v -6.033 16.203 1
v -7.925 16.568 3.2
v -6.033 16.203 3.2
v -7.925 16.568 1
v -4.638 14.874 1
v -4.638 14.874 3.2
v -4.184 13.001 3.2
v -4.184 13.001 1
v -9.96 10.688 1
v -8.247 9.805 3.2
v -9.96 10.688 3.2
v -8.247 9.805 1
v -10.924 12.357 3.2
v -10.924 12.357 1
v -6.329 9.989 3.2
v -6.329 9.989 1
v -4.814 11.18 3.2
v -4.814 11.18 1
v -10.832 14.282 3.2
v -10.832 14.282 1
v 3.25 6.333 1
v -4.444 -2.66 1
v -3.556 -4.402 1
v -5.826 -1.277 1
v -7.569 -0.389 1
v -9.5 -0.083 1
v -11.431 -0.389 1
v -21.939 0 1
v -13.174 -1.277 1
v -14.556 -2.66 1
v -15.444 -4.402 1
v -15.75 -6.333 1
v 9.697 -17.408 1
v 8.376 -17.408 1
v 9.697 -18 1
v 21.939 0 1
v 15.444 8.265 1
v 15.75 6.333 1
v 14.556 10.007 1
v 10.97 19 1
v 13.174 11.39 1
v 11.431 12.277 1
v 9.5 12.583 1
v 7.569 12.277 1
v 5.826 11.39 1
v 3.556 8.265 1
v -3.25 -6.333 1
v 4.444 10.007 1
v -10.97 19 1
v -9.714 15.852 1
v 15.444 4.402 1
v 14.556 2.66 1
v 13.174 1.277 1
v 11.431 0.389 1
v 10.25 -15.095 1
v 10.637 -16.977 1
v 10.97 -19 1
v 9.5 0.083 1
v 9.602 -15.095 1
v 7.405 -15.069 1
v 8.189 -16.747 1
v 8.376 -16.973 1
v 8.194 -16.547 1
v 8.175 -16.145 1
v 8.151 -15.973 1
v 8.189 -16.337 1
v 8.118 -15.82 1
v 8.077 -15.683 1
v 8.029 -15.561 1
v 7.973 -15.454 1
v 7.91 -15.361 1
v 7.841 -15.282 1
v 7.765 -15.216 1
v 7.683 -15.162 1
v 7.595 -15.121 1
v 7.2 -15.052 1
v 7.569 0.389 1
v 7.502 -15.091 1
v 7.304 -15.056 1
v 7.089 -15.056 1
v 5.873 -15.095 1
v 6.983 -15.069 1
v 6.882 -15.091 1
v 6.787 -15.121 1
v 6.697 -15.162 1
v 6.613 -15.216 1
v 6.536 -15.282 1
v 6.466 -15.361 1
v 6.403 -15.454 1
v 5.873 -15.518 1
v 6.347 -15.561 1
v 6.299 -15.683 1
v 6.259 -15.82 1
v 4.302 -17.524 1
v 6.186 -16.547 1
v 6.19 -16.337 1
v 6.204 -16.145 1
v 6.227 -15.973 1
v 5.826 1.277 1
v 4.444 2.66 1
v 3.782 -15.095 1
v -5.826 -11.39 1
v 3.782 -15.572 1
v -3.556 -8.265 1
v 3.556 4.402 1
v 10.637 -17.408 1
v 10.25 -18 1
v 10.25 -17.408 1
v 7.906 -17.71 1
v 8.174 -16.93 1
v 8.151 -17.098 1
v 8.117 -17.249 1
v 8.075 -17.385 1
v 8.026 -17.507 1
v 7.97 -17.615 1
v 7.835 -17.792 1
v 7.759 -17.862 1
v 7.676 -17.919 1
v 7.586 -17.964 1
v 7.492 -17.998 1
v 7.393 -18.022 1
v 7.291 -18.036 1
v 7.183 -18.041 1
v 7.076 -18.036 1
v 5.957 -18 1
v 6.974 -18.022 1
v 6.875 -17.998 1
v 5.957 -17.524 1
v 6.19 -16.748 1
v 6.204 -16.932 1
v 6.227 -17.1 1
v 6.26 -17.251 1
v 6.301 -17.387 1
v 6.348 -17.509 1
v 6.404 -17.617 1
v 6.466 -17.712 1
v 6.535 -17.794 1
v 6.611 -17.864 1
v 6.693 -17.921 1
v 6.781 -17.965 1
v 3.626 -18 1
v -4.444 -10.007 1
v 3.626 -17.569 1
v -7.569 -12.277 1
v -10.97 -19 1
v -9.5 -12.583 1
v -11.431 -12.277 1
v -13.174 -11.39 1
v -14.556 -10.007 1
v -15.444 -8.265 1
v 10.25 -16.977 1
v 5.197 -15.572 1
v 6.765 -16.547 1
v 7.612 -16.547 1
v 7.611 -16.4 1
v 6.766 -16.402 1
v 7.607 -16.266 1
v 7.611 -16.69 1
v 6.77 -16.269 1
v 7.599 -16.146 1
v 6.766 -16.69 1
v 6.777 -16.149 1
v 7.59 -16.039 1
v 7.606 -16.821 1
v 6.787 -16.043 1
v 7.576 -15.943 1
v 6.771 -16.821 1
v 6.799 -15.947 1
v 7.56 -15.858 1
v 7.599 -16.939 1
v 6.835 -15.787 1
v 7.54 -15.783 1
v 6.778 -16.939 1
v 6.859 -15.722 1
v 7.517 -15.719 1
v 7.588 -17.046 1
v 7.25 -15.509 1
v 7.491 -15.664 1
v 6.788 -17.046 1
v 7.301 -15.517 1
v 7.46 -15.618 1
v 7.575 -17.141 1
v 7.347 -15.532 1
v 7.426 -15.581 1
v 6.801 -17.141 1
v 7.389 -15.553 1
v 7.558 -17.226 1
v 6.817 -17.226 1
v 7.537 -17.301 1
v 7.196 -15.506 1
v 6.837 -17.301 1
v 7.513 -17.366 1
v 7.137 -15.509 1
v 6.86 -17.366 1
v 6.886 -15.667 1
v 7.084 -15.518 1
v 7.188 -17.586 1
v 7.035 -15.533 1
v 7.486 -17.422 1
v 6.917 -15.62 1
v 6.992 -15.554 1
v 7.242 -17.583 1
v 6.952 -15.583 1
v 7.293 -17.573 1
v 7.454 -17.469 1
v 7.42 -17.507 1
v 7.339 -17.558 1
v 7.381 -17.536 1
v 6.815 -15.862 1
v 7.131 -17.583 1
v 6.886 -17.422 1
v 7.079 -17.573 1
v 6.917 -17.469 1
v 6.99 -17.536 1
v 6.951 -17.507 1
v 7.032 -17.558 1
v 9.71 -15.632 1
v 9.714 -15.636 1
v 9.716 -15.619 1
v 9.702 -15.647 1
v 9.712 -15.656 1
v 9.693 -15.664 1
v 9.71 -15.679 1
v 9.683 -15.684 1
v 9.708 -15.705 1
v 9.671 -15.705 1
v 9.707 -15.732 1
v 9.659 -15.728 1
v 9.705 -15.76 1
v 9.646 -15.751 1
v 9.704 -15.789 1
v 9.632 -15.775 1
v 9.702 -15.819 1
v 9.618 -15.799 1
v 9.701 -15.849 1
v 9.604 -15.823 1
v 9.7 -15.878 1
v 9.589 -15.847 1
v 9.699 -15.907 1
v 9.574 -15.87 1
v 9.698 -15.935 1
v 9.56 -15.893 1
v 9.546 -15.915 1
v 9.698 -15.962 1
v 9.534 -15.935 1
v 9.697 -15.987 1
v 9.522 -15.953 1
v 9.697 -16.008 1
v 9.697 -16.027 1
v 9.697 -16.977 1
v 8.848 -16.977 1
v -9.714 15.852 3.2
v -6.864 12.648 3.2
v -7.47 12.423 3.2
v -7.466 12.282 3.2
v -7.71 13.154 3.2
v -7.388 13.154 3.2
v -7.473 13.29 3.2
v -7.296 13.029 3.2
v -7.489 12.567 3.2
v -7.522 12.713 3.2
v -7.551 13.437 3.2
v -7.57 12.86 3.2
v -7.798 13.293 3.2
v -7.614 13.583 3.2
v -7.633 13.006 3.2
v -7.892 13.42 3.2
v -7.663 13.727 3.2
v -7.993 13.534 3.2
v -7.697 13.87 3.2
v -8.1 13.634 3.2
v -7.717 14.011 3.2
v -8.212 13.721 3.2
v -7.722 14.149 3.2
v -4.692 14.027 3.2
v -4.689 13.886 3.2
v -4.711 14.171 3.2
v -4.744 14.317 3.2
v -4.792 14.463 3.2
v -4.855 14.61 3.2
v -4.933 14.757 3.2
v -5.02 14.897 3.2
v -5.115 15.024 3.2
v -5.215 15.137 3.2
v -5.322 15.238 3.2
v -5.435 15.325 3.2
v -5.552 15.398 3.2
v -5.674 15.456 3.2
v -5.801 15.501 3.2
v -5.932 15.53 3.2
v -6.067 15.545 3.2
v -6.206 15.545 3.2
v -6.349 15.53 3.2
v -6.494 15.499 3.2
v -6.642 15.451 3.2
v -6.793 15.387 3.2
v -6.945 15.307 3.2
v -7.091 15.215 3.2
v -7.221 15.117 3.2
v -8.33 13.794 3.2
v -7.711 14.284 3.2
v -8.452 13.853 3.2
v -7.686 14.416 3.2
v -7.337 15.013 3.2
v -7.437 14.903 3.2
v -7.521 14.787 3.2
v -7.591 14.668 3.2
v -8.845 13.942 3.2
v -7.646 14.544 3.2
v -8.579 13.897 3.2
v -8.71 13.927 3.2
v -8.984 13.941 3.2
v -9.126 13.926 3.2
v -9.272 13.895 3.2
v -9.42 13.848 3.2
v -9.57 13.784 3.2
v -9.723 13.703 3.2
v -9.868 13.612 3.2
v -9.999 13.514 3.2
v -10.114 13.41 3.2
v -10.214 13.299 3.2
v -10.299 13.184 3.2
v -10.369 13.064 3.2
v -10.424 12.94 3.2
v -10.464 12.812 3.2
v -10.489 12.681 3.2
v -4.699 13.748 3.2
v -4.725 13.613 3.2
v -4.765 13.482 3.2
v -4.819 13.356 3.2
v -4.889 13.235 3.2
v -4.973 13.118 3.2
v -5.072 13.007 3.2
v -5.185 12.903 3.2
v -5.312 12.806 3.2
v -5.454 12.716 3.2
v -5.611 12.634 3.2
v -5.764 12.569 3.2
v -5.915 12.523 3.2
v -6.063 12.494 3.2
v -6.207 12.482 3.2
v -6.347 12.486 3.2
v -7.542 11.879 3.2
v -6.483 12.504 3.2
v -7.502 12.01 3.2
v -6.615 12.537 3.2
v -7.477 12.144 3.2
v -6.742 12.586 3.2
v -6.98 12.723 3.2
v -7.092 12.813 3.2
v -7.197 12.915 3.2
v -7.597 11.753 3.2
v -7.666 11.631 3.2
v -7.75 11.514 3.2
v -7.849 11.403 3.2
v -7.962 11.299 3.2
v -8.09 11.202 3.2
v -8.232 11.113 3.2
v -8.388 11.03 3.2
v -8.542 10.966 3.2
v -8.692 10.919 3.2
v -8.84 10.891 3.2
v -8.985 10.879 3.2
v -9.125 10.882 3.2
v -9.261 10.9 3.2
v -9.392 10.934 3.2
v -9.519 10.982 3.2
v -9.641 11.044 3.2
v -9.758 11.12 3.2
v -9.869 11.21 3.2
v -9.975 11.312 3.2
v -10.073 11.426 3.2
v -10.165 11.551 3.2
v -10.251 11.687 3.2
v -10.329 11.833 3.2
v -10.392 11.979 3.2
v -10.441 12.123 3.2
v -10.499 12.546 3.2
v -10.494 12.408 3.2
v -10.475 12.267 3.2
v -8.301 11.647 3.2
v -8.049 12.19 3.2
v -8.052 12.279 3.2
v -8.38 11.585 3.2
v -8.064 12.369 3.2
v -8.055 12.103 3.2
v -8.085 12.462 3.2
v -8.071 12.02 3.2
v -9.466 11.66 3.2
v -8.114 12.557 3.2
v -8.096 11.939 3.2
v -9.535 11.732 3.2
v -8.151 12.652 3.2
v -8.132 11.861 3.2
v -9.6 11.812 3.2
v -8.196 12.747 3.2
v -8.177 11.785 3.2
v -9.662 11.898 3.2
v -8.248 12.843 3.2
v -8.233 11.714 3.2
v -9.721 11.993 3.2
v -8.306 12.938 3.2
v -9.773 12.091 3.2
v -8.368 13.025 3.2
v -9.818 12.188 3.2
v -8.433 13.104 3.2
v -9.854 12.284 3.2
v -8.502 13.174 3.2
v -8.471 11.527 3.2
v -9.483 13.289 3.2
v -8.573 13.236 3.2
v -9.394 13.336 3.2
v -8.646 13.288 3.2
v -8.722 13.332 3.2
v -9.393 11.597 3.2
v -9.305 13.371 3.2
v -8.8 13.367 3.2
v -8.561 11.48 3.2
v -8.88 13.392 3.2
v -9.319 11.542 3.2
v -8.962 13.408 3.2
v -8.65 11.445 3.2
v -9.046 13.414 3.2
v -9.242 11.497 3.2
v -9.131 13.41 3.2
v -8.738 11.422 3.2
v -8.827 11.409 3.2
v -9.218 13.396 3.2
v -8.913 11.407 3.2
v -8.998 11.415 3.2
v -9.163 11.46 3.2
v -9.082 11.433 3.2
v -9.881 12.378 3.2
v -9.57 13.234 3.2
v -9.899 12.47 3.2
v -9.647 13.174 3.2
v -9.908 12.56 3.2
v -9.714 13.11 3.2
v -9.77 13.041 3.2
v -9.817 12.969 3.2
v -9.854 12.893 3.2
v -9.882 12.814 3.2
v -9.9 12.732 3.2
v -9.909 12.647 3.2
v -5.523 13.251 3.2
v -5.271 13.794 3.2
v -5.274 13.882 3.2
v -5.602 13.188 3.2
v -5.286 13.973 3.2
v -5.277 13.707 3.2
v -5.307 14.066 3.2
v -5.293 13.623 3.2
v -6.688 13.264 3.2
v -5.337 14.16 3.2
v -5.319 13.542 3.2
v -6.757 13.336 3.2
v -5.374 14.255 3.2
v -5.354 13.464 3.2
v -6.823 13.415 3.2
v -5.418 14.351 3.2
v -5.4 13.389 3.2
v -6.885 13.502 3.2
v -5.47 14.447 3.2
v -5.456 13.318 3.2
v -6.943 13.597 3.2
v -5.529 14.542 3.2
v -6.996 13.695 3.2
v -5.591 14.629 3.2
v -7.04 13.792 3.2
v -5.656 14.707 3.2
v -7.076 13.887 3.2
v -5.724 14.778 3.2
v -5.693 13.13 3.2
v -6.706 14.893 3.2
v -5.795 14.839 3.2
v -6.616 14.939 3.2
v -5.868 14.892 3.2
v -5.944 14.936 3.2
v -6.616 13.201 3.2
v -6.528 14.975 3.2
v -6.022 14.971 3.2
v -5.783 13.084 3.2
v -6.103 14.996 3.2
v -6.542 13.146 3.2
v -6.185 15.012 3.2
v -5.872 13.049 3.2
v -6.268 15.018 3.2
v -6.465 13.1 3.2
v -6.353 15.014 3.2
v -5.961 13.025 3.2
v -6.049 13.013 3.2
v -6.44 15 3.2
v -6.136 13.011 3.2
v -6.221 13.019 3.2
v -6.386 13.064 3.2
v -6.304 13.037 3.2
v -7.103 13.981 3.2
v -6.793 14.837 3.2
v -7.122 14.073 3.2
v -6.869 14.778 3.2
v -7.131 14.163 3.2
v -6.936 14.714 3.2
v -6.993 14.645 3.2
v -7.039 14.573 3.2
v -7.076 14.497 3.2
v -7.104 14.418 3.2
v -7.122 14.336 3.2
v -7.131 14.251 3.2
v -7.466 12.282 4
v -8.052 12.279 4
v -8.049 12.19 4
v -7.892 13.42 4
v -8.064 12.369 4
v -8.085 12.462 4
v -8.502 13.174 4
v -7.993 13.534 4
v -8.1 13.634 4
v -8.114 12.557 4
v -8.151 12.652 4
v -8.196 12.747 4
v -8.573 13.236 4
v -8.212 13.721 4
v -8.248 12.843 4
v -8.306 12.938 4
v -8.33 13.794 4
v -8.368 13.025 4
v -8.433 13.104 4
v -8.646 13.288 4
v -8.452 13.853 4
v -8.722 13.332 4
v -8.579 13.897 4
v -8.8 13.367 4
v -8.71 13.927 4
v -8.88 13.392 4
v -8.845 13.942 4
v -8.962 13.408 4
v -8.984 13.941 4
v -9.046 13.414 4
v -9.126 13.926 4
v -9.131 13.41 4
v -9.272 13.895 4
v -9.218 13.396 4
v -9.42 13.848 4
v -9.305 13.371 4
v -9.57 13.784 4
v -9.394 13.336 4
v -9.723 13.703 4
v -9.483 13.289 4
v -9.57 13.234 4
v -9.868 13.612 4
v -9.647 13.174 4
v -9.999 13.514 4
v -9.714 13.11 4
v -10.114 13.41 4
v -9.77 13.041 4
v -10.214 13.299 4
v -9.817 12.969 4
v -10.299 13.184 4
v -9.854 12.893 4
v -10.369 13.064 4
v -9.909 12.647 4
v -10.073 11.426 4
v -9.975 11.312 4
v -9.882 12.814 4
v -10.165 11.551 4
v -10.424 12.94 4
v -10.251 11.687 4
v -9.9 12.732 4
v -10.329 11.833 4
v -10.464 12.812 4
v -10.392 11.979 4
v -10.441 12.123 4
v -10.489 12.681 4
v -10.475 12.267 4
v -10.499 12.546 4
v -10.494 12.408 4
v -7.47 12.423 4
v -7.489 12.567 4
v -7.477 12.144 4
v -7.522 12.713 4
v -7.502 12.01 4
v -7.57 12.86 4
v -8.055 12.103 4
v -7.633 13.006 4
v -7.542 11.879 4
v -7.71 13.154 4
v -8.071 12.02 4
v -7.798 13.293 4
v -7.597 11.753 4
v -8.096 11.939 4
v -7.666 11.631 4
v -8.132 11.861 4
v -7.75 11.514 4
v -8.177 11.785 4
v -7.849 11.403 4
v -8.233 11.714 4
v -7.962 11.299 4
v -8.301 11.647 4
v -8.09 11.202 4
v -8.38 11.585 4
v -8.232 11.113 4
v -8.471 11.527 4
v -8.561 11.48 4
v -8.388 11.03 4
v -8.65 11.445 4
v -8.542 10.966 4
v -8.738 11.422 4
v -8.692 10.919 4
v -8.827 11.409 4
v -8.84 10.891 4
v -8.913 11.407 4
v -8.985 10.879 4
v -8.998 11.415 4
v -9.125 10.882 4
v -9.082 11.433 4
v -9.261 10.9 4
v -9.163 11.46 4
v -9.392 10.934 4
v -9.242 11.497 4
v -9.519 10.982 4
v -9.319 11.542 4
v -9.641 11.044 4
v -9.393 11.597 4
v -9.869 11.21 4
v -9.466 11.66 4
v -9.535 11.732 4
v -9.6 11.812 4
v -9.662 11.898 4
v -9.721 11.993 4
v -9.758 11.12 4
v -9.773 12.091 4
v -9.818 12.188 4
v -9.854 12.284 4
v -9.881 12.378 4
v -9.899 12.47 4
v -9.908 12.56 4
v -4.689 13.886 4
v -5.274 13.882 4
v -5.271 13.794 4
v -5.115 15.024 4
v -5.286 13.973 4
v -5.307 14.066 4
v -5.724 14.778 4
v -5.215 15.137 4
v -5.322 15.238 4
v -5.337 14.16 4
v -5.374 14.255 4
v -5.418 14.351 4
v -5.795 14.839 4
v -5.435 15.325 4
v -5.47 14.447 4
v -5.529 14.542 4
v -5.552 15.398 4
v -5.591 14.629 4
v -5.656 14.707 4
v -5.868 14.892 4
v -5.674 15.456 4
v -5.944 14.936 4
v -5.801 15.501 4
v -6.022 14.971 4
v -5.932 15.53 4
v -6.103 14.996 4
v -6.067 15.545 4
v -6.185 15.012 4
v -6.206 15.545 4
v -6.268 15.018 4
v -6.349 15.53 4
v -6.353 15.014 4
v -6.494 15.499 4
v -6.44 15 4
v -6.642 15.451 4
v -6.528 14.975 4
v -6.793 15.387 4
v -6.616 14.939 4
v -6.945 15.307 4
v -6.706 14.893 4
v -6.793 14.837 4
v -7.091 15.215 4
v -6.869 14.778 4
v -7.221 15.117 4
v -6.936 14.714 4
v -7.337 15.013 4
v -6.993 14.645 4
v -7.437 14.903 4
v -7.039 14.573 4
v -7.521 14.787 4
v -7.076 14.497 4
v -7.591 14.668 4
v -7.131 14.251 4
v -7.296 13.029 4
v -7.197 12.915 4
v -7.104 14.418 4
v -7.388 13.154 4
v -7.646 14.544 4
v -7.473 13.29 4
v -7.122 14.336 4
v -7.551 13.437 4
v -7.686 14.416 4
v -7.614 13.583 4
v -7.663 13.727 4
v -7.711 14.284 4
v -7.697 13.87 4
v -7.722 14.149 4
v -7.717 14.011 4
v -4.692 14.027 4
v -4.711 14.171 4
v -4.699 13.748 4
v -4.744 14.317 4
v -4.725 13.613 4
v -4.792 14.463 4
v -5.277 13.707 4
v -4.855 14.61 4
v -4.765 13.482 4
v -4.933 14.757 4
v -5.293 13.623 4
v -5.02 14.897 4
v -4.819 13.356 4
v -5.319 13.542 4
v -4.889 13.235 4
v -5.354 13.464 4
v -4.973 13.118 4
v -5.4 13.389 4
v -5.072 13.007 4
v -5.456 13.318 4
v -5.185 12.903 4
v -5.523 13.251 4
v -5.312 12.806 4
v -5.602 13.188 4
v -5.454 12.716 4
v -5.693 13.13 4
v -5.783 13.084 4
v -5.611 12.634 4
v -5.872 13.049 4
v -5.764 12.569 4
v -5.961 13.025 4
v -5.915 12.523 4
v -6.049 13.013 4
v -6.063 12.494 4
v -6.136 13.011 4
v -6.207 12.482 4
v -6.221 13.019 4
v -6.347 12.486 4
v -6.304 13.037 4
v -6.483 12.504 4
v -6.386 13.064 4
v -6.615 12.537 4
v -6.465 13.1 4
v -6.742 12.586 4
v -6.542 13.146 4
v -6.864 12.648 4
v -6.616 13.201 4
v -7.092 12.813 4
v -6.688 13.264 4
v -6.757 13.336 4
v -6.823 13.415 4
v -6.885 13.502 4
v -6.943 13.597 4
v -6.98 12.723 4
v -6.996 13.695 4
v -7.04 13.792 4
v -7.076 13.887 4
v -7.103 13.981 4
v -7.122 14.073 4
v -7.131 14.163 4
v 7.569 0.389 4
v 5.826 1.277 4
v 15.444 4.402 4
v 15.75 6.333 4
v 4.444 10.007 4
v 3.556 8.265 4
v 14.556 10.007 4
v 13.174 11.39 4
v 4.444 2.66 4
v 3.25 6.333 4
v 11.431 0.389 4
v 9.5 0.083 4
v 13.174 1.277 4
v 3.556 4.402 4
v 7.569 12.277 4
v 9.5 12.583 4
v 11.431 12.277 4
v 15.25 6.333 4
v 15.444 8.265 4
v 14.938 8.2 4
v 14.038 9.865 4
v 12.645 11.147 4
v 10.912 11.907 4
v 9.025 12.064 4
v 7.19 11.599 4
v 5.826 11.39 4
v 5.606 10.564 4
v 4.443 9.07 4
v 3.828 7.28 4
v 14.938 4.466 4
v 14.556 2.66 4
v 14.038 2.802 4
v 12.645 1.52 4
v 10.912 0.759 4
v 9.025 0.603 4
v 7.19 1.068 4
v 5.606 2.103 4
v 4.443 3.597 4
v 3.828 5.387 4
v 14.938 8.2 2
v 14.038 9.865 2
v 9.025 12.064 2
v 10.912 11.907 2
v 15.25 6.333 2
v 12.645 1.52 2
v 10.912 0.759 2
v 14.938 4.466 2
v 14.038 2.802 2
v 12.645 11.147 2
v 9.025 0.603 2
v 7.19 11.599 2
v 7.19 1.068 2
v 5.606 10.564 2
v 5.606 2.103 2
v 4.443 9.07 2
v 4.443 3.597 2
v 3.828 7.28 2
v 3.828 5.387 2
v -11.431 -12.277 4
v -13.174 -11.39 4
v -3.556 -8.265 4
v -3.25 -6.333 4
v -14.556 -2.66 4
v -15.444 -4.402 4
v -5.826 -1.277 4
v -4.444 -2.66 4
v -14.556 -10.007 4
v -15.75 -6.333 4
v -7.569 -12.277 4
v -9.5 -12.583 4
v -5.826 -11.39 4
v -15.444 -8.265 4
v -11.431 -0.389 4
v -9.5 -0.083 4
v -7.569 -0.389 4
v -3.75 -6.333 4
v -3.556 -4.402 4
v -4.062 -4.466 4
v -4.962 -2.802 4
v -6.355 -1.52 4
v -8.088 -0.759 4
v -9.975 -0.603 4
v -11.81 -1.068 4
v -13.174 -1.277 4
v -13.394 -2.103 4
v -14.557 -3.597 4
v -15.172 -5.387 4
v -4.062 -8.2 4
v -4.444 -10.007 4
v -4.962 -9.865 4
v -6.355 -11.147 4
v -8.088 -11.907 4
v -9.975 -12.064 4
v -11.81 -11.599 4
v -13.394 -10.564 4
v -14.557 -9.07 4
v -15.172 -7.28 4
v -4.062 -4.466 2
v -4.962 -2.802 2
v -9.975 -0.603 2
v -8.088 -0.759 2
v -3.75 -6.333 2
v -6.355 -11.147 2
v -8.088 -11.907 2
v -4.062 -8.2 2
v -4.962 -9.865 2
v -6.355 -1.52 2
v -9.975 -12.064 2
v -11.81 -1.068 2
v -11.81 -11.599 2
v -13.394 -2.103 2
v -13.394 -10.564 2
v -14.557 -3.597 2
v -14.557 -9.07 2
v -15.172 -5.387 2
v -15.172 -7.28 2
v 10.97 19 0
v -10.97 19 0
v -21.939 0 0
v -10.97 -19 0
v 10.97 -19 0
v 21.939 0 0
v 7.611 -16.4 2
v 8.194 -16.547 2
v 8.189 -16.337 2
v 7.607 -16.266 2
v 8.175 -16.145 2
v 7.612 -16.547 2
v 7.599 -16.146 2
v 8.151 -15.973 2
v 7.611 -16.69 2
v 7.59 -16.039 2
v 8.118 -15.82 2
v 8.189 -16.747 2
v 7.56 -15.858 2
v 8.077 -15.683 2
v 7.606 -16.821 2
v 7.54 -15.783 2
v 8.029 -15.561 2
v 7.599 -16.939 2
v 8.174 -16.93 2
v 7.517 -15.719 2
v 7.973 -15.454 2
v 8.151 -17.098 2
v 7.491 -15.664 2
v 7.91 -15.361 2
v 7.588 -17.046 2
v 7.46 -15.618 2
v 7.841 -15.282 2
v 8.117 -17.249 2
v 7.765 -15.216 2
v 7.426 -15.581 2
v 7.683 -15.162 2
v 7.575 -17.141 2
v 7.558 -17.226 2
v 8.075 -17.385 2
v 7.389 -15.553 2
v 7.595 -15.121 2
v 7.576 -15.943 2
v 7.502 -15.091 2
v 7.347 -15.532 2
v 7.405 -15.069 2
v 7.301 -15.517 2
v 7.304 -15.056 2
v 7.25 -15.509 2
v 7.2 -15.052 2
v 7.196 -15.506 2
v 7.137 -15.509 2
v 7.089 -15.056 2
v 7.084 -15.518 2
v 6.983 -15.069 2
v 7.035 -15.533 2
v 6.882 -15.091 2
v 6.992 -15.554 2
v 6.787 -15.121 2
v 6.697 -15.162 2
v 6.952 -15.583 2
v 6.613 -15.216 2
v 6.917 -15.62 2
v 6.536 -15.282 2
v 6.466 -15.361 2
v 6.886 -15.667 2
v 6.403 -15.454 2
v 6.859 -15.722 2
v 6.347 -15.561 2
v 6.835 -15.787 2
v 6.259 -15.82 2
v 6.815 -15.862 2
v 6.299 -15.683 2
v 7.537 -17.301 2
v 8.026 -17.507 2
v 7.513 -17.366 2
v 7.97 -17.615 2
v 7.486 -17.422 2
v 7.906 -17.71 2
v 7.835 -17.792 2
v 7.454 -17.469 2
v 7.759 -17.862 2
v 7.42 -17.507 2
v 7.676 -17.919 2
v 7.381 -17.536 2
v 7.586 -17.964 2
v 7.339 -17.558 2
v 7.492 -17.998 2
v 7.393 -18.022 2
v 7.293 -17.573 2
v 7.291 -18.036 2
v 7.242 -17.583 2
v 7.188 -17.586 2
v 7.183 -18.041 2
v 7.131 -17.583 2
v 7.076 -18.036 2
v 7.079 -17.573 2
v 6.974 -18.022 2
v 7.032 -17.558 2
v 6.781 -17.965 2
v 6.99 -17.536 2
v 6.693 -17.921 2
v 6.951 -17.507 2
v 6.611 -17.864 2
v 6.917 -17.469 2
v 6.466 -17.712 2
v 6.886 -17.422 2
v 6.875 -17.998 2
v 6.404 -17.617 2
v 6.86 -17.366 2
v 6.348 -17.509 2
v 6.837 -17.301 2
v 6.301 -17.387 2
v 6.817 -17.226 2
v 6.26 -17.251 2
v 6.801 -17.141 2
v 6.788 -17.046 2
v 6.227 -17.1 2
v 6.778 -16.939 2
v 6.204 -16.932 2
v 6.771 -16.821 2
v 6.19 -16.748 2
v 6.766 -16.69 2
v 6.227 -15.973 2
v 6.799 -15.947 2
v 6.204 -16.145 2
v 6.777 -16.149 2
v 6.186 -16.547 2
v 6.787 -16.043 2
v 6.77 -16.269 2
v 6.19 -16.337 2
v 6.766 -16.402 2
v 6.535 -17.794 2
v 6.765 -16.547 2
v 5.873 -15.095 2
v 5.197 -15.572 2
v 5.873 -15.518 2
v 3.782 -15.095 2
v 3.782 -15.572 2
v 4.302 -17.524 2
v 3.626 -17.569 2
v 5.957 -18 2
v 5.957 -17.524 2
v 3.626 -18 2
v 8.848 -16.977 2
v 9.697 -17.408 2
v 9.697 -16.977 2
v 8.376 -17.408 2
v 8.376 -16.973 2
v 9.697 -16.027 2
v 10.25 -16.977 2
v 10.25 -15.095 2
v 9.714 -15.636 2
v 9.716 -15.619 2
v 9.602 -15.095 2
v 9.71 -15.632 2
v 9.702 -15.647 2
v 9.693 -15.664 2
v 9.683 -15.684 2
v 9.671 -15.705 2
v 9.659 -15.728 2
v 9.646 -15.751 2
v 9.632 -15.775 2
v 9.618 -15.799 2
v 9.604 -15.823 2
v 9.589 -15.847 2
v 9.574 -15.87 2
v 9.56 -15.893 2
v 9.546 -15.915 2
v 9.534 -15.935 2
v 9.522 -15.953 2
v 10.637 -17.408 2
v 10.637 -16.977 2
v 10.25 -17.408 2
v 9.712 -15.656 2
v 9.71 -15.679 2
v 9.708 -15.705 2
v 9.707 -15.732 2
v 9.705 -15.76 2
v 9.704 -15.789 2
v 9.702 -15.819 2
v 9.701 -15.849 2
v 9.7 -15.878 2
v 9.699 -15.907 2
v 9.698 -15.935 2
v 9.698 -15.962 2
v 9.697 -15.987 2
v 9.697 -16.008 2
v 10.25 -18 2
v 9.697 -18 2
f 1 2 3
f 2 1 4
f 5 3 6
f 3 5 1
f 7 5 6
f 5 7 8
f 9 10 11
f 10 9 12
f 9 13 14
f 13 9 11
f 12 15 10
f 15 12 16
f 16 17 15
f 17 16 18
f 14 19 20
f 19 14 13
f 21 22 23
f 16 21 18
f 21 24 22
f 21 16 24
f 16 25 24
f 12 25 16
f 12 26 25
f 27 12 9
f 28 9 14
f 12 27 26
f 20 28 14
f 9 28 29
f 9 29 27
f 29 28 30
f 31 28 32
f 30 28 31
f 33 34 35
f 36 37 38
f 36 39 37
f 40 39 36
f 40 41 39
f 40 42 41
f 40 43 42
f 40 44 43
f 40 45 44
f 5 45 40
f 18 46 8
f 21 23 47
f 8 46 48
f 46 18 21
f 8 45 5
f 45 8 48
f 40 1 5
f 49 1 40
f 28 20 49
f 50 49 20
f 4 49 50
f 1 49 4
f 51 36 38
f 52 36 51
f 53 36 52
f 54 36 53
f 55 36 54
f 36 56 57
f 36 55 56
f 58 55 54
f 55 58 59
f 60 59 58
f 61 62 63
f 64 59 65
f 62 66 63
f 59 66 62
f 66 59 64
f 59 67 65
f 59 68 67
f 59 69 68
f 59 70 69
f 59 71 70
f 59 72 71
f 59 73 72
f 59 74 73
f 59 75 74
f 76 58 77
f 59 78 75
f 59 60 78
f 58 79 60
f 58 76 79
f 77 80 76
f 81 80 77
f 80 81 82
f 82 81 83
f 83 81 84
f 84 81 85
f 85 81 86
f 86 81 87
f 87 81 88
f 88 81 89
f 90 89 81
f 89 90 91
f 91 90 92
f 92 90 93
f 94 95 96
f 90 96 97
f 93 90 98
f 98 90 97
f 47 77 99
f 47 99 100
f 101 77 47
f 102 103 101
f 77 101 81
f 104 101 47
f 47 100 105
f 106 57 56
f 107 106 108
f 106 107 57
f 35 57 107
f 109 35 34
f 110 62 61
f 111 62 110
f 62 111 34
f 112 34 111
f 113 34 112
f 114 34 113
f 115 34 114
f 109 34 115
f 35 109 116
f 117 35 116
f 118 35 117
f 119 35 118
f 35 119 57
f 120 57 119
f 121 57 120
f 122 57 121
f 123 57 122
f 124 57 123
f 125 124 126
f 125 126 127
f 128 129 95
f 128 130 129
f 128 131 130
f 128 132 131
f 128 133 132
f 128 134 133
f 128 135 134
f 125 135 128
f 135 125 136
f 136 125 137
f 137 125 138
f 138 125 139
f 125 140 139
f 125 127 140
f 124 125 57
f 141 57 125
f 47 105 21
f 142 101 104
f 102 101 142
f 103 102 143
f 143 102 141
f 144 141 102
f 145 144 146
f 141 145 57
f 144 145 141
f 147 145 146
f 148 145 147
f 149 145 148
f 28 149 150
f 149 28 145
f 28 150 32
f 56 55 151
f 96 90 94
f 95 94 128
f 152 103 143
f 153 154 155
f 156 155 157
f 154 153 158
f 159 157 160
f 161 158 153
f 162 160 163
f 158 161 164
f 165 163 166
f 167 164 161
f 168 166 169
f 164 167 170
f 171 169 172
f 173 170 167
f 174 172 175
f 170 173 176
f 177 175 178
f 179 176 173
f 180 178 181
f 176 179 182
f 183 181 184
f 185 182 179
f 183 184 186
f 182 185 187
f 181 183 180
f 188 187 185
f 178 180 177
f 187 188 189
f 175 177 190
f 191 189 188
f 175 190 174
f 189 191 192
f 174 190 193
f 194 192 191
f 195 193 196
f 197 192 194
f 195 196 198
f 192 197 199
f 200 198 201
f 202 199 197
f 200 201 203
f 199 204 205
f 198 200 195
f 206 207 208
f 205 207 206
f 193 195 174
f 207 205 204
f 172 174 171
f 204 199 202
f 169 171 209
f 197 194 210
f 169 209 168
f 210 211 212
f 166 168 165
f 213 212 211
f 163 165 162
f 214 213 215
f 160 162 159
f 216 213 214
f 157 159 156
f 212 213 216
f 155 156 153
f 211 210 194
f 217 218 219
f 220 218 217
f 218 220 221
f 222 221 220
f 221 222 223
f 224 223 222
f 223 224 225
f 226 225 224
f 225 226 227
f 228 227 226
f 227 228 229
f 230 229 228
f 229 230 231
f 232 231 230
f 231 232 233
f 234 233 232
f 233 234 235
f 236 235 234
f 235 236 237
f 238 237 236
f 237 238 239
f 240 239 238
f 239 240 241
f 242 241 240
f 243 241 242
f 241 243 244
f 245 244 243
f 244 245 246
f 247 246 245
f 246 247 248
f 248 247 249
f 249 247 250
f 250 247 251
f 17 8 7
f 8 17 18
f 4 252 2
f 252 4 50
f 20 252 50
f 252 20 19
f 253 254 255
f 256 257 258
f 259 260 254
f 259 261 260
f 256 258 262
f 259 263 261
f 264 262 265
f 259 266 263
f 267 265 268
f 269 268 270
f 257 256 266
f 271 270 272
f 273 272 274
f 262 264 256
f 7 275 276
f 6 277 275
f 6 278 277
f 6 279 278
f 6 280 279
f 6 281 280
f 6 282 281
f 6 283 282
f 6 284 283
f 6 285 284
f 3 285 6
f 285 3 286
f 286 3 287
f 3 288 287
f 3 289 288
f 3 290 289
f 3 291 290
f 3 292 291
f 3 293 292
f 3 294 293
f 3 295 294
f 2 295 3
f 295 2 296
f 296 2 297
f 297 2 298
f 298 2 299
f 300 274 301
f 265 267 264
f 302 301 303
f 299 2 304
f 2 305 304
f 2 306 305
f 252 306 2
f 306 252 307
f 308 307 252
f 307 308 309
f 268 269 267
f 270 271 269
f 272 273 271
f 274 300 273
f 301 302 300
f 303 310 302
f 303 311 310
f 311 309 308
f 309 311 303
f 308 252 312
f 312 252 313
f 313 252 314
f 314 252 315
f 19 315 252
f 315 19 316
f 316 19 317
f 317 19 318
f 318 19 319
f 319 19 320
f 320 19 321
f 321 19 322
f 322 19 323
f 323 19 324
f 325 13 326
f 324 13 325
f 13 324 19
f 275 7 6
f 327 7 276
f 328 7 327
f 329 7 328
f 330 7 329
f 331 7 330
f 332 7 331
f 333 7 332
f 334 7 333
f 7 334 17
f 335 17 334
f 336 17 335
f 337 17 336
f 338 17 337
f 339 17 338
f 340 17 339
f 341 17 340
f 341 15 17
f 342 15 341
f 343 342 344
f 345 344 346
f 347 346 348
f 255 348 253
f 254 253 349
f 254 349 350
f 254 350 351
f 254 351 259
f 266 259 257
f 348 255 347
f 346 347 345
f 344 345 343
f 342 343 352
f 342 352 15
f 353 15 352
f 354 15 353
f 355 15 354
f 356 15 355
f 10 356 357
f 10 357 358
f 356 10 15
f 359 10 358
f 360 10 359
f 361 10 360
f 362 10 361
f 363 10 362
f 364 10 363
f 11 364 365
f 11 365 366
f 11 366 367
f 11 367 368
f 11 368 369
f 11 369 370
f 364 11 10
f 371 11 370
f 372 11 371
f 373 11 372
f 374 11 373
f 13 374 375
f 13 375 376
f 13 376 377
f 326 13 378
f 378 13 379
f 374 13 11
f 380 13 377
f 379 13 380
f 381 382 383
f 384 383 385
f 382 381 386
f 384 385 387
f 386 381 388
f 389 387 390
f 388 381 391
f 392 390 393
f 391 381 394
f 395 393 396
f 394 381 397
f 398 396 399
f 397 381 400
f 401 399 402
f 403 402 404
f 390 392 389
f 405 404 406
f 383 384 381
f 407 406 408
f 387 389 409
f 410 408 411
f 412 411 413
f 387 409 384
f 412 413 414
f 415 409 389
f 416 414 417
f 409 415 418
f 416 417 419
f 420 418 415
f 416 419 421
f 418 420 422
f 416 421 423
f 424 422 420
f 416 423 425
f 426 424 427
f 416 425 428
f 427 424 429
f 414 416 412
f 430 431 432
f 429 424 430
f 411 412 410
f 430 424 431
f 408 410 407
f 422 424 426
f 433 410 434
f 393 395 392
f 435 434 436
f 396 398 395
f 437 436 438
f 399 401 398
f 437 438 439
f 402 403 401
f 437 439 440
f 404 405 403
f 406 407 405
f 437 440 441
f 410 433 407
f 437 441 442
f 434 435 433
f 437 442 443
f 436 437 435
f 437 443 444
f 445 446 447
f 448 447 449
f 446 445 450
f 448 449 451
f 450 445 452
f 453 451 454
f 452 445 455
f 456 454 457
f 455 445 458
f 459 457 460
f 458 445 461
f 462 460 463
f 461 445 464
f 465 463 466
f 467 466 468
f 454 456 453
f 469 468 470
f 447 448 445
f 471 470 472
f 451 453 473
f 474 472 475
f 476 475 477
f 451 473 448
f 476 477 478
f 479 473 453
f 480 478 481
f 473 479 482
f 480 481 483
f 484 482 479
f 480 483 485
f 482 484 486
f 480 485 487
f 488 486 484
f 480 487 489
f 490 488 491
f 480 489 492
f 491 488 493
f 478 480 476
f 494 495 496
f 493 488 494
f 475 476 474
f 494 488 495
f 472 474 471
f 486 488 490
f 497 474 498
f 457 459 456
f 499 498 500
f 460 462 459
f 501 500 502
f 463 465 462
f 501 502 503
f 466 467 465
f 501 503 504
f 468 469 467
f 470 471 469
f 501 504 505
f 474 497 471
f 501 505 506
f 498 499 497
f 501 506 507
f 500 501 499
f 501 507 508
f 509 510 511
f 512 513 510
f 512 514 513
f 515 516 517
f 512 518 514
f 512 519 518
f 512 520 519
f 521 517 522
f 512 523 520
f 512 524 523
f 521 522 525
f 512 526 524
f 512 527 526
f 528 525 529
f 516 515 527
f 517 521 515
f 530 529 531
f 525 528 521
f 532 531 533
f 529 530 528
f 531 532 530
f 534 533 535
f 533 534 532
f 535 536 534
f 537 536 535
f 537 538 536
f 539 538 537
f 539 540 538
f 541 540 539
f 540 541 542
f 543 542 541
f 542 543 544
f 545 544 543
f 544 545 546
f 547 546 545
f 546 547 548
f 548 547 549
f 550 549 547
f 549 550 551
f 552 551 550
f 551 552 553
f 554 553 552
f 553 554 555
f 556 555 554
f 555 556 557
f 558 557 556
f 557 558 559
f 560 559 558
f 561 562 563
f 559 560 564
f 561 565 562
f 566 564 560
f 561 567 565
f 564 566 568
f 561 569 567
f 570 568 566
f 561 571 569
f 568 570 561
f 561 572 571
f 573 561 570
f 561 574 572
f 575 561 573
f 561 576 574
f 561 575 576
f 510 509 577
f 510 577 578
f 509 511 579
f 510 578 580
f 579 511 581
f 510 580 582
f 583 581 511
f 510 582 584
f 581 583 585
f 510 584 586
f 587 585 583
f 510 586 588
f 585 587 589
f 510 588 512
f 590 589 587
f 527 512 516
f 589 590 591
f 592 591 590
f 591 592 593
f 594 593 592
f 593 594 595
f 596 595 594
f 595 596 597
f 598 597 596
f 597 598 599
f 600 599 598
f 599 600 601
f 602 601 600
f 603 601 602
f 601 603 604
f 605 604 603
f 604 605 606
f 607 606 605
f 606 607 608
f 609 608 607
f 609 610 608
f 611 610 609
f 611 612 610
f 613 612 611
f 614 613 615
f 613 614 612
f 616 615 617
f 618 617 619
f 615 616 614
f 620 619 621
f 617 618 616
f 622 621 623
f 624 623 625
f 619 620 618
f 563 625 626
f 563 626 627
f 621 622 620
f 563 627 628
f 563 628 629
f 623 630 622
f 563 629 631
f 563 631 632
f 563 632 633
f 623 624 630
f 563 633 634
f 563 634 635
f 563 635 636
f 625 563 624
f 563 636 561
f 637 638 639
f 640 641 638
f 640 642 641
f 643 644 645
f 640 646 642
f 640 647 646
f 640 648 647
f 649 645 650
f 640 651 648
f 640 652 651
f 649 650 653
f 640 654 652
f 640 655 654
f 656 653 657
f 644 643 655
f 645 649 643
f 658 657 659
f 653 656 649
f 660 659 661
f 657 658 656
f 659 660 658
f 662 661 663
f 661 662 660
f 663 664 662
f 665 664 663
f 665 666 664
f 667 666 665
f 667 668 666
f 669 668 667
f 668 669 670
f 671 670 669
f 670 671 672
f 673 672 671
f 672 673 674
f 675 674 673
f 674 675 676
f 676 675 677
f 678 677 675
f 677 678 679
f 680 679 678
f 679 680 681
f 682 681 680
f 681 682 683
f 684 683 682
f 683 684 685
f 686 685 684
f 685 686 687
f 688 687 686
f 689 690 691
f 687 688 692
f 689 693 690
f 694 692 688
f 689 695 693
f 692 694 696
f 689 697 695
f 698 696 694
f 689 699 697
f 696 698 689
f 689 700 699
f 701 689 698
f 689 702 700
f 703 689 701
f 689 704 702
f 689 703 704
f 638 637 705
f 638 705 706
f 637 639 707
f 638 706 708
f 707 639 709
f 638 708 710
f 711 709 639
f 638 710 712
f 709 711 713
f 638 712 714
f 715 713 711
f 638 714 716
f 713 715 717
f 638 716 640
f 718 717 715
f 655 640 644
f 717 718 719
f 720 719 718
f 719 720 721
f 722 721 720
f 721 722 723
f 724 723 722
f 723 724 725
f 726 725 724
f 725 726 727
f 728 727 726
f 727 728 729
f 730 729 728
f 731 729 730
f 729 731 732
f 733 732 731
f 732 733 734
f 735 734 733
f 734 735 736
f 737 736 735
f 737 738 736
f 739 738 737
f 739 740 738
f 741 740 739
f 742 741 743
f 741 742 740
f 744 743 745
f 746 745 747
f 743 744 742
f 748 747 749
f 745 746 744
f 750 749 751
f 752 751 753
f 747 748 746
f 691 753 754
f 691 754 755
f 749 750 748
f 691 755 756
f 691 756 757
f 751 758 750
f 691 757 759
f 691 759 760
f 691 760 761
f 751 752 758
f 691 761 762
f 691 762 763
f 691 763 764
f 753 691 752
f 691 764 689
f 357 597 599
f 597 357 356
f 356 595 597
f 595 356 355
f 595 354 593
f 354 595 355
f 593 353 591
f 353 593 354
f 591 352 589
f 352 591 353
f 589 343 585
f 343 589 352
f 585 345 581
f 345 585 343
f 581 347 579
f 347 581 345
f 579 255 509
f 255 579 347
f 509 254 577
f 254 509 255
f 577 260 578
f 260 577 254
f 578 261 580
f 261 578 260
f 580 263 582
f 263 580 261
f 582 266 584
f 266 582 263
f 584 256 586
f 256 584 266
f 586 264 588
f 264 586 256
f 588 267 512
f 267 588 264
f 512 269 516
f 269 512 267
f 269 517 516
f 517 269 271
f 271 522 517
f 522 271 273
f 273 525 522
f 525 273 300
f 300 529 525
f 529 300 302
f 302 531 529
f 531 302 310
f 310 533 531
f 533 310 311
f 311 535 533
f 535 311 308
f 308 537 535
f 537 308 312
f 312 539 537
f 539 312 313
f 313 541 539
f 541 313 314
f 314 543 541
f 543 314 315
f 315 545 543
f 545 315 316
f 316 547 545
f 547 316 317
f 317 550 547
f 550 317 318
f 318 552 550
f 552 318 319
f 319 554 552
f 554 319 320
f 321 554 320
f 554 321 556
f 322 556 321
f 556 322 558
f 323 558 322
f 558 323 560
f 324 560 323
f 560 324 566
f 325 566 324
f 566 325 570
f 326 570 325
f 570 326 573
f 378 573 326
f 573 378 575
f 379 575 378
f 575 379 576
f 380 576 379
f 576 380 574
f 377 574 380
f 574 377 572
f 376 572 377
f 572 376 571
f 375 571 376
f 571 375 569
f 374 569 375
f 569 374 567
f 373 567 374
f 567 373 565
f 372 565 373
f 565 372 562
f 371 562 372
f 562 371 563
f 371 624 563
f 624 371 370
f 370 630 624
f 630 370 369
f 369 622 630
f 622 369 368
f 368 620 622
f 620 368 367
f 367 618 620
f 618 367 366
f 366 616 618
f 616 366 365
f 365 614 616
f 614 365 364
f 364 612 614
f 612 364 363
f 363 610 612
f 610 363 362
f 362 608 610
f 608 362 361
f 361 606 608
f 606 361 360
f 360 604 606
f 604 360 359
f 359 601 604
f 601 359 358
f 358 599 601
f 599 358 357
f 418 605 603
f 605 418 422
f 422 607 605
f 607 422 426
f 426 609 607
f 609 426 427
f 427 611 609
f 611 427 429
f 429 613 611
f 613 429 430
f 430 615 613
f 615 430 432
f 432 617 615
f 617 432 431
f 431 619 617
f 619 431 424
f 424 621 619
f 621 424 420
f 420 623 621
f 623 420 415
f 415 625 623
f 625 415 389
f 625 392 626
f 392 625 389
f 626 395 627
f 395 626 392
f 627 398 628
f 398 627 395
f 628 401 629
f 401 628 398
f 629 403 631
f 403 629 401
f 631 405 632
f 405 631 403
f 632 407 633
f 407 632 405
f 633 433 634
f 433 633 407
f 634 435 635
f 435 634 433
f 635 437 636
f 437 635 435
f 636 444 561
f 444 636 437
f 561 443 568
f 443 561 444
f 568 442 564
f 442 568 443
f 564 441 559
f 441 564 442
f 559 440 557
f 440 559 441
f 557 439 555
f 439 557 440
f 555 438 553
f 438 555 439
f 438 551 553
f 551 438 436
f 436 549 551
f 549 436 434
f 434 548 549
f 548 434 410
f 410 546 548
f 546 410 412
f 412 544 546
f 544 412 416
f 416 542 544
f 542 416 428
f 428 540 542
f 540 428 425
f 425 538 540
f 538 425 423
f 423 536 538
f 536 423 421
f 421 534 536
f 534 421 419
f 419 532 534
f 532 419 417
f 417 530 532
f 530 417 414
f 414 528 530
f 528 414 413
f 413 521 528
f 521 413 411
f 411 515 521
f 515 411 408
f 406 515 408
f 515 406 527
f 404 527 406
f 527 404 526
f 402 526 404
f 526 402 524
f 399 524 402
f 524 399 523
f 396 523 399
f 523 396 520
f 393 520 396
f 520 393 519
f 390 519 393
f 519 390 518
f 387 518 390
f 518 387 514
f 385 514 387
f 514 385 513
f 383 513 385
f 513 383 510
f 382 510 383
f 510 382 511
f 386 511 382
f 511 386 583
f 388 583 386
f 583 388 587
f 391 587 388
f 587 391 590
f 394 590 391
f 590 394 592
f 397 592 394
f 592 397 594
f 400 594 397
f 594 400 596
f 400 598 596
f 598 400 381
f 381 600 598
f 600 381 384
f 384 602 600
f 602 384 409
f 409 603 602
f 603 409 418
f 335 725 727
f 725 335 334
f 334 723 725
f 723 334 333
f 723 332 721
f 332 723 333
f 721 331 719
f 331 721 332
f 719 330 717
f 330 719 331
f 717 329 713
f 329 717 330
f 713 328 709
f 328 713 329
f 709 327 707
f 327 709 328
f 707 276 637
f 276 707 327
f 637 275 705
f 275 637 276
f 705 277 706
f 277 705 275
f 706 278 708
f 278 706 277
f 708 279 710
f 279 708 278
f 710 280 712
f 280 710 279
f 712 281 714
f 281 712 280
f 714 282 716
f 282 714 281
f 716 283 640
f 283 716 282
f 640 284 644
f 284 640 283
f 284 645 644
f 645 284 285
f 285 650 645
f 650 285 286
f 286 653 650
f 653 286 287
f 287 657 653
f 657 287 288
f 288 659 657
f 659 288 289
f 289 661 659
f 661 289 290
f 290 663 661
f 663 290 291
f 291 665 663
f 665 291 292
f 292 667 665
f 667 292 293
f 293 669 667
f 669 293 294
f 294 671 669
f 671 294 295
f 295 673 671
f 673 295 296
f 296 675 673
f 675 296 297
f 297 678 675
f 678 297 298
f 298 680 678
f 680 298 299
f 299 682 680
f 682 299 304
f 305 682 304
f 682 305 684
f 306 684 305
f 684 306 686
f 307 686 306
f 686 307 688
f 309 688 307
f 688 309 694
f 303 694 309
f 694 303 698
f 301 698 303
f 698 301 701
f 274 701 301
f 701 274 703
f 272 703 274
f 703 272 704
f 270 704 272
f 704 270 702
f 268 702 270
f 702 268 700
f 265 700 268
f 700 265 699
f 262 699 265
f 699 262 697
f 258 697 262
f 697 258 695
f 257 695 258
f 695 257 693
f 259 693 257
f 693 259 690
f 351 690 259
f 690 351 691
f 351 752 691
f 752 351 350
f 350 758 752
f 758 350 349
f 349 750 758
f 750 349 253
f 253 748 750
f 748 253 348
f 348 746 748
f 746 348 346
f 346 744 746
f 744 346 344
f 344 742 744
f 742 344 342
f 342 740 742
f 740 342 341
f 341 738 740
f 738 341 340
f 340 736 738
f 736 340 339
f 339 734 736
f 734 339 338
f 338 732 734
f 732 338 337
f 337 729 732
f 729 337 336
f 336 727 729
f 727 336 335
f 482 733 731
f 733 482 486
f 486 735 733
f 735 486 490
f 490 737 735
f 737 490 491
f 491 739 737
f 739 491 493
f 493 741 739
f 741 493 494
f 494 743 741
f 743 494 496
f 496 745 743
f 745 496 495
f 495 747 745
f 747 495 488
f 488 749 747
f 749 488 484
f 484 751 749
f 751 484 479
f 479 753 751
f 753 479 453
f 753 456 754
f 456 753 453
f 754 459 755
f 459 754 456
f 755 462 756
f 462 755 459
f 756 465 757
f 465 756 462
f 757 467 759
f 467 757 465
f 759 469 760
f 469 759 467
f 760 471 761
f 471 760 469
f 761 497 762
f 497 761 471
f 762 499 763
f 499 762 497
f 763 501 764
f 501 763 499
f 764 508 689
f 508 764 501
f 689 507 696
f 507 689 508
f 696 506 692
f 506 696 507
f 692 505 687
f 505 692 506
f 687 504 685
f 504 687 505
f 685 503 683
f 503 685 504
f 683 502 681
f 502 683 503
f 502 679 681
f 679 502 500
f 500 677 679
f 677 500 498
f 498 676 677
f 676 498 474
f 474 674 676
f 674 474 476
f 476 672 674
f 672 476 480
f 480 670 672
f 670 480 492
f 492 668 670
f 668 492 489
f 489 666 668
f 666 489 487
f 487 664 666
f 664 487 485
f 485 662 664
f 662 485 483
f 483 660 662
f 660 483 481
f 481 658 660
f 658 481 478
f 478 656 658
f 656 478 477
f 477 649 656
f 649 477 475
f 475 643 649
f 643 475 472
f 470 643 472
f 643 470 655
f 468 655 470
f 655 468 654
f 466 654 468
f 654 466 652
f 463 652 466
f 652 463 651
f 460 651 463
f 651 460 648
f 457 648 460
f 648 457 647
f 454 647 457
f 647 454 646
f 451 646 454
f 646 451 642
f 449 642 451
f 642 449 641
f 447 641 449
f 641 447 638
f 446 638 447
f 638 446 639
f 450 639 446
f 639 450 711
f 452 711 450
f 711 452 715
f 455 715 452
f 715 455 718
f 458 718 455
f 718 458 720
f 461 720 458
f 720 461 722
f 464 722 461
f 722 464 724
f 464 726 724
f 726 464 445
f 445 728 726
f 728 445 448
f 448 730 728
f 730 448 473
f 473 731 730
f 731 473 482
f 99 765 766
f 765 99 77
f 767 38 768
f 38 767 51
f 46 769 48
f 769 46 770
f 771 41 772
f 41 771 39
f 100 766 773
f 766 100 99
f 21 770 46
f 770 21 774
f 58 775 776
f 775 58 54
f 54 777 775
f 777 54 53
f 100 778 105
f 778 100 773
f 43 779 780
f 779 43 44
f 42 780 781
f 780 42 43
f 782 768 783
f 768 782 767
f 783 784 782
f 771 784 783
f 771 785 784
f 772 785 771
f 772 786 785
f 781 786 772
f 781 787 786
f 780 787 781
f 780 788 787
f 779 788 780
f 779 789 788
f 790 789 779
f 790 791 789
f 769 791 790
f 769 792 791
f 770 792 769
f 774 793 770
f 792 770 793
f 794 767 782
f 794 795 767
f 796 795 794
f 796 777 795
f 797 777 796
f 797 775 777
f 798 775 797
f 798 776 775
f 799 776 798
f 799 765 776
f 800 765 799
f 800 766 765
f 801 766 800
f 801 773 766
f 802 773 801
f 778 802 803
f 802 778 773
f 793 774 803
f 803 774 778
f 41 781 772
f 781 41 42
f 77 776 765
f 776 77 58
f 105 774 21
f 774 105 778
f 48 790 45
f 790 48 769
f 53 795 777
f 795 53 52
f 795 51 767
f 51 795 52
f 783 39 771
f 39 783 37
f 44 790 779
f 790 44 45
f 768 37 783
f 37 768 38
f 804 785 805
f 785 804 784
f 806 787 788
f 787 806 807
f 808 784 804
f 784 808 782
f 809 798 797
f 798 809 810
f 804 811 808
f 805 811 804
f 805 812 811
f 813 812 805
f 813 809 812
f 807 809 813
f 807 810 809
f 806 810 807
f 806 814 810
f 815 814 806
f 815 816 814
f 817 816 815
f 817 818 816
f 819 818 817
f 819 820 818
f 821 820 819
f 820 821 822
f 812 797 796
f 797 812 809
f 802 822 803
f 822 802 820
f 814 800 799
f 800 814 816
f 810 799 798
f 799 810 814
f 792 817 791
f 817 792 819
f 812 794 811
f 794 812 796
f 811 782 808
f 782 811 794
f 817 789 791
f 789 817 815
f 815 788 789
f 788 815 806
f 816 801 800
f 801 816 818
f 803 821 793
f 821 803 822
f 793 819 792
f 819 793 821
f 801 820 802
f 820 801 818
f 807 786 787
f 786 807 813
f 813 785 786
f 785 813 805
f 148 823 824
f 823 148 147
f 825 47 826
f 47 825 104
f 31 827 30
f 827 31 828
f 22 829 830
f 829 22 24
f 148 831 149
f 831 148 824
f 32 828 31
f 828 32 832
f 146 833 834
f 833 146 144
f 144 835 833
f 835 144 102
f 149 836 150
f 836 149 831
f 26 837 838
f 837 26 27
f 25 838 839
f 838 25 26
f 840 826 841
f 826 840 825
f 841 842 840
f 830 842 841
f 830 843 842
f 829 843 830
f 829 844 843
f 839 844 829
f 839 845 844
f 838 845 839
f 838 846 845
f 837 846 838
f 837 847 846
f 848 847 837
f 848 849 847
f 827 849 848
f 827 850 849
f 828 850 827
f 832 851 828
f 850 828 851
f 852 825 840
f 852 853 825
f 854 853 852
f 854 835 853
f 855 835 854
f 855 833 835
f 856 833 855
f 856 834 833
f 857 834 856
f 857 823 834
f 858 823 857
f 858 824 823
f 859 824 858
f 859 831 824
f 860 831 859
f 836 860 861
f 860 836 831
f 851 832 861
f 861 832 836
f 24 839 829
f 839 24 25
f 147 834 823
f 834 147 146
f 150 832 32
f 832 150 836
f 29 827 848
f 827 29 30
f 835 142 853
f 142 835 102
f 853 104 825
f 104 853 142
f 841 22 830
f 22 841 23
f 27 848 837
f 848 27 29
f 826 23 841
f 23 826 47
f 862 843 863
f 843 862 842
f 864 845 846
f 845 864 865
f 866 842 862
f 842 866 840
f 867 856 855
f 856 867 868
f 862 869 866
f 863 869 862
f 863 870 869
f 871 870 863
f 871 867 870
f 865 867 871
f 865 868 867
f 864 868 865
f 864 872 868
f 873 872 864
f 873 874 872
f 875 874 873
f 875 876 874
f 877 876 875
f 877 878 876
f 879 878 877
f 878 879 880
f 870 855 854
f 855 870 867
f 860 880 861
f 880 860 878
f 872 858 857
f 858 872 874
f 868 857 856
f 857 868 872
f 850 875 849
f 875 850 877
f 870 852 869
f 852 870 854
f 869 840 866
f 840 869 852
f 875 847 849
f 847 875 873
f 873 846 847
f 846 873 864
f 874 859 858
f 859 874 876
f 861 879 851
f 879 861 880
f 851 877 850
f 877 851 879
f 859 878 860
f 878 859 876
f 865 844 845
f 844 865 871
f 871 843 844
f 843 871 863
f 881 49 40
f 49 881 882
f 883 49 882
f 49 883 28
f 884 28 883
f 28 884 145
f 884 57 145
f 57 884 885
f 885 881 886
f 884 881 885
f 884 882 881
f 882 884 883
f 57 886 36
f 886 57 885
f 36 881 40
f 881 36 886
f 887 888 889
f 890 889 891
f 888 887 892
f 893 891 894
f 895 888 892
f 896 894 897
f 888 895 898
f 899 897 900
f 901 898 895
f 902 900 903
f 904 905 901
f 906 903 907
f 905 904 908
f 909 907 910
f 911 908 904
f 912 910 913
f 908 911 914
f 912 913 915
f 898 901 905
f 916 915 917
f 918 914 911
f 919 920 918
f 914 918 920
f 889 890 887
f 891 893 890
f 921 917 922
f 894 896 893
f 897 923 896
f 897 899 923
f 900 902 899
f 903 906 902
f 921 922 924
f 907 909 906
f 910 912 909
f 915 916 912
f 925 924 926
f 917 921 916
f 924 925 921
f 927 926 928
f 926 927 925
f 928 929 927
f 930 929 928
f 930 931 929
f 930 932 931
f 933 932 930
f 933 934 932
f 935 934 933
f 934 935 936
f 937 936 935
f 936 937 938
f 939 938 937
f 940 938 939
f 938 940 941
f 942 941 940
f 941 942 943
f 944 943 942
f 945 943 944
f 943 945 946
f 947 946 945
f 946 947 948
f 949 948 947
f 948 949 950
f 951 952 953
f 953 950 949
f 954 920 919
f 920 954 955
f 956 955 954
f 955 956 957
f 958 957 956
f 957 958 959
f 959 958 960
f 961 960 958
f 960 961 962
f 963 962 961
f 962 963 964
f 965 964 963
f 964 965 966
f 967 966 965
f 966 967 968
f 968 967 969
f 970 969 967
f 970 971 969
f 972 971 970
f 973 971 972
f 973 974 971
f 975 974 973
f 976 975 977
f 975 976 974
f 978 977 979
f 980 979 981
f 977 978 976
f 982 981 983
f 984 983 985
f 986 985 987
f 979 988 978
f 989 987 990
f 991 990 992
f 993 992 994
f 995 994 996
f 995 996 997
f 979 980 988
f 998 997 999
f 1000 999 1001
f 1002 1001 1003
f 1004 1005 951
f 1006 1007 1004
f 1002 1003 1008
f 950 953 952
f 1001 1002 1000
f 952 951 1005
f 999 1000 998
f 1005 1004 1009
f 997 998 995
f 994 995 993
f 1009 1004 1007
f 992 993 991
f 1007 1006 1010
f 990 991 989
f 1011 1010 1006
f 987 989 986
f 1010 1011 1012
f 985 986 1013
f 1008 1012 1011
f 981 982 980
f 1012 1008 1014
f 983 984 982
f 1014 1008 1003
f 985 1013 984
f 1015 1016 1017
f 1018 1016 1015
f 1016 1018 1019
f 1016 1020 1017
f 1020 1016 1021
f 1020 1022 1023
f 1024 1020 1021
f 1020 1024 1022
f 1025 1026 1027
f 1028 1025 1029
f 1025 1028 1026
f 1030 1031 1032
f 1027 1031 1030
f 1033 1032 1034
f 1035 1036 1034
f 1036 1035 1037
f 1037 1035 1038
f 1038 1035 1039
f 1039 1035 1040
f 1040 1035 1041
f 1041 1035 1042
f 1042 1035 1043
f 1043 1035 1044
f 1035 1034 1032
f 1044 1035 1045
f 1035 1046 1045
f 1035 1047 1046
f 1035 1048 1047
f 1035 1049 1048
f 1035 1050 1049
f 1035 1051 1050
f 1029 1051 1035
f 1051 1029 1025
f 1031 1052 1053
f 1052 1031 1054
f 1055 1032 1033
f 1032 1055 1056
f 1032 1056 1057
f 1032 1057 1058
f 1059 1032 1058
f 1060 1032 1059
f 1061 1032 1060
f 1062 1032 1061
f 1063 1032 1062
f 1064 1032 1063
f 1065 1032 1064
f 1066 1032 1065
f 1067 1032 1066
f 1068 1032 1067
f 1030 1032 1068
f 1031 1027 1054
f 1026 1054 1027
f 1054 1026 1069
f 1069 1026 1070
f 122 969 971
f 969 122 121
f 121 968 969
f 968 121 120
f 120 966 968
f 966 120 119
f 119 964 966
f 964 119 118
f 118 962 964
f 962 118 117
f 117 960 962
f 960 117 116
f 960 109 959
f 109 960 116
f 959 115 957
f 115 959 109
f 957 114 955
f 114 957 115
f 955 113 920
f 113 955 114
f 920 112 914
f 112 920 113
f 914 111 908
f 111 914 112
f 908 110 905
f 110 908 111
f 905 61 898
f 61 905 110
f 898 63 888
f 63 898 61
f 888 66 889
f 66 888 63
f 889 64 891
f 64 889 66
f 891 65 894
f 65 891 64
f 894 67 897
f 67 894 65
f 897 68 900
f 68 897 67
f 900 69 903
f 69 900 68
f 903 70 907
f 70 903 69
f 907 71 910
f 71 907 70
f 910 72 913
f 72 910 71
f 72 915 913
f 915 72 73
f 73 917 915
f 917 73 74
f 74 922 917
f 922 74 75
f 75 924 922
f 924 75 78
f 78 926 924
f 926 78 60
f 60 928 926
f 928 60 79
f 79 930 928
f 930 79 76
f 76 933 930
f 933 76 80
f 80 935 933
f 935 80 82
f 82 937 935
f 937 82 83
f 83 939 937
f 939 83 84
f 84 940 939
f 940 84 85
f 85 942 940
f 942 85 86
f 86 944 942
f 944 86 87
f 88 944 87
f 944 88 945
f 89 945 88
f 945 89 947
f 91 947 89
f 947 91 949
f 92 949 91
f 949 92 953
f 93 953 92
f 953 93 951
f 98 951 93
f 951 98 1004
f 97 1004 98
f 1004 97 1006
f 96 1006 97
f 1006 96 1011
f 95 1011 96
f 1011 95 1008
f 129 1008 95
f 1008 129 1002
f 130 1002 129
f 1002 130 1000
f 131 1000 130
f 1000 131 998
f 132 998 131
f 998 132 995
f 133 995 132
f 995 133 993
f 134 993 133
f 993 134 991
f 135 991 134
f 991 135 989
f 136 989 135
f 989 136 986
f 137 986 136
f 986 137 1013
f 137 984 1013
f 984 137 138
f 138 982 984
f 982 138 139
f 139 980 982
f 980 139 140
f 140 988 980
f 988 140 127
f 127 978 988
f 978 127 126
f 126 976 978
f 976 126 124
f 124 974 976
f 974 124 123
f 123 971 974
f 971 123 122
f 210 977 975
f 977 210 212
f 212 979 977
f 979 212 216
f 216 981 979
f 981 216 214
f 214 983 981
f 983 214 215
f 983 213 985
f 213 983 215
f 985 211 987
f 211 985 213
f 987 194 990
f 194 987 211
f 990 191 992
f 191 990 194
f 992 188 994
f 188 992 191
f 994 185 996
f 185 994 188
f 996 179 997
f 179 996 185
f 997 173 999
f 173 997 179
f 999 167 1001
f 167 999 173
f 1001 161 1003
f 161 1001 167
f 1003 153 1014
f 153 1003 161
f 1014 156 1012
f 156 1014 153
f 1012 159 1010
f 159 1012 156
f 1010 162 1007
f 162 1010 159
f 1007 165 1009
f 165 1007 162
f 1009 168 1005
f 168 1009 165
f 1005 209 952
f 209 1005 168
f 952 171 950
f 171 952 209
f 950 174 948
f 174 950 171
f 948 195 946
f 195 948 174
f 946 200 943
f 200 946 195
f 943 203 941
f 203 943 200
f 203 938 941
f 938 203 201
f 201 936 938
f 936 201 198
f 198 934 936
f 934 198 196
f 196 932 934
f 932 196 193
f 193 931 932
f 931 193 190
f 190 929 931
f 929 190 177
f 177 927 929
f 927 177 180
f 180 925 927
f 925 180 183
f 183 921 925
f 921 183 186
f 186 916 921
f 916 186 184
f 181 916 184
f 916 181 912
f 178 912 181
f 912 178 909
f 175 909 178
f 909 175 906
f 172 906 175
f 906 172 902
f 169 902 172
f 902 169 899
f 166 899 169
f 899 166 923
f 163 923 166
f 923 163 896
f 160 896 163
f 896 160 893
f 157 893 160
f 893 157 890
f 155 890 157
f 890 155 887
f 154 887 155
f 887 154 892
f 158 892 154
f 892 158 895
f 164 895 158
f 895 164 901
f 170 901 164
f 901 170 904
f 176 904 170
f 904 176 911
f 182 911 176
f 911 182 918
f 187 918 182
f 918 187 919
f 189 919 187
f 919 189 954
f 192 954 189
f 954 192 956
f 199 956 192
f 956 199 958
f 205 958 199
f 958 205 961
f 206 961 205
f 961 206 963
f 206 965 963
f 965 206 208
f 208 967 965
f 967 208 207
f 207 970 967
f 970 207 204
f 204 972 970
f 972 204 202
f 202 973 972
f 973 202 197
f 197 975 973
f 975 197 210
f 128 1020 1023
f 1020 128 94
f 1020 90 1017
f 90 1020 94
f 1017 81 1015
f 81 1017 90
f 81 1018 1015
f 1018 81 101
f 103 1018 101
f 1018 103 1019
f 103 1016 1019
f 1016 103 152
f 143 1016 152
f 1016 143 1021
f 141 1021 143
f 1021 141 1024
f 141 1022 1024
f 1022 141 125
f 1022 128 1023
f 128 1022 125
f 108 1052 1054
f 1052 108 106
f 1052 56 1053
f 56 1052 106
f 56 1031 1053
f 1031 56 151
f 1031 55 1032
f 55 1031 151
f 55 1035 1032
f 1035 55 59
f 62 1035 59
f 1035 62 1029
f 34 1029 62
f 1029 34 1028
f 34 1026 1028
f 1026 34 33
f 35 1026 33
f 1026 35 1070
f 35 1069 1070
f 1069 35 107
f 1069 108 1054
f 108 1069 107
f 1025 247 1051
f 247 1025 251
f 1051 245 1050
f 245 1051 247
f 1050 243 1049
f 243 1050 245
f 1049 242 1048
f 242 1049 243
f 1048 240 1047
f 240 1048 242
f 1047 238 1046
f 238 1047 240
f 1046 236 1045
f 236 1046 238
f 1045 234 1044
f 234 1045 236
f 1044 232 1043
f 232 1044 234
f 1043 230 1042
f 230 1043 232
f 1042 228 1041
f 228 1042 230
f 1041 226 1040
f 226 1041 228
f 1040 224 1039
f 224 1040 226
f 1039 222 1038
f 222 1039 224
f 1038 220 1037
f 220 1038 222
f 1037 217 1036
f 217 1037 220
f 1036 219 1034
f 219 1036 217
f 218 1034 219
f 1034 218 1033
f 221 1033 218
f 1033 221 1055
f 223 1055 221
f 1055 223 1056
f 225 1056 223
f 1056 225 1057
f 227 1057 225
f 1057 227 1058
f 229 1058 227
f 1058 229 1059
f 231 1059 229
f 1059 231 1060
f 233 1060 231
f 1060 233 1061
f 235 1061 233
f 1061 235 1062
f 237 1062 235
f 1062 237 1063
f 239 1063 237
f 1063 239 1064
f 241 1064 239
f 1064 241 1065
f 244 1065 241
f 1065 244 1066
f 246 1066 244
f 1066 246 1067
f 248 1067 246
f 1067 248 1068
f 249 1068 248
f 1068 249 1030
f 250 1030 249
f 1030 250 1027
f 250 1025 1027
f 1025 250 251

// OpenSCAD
include <../../Scripts/18xx tiles basic functions.scad>
hex("Yellow");
put_value_blue("OO",-30);
translate([hex_size/2,hex_size/3,0]) single_city([]);
put_tilenr("Z04");
//put_value_red("$40");
translate([-hex_size/2,-hex_size/3,0]) single_city([]);
